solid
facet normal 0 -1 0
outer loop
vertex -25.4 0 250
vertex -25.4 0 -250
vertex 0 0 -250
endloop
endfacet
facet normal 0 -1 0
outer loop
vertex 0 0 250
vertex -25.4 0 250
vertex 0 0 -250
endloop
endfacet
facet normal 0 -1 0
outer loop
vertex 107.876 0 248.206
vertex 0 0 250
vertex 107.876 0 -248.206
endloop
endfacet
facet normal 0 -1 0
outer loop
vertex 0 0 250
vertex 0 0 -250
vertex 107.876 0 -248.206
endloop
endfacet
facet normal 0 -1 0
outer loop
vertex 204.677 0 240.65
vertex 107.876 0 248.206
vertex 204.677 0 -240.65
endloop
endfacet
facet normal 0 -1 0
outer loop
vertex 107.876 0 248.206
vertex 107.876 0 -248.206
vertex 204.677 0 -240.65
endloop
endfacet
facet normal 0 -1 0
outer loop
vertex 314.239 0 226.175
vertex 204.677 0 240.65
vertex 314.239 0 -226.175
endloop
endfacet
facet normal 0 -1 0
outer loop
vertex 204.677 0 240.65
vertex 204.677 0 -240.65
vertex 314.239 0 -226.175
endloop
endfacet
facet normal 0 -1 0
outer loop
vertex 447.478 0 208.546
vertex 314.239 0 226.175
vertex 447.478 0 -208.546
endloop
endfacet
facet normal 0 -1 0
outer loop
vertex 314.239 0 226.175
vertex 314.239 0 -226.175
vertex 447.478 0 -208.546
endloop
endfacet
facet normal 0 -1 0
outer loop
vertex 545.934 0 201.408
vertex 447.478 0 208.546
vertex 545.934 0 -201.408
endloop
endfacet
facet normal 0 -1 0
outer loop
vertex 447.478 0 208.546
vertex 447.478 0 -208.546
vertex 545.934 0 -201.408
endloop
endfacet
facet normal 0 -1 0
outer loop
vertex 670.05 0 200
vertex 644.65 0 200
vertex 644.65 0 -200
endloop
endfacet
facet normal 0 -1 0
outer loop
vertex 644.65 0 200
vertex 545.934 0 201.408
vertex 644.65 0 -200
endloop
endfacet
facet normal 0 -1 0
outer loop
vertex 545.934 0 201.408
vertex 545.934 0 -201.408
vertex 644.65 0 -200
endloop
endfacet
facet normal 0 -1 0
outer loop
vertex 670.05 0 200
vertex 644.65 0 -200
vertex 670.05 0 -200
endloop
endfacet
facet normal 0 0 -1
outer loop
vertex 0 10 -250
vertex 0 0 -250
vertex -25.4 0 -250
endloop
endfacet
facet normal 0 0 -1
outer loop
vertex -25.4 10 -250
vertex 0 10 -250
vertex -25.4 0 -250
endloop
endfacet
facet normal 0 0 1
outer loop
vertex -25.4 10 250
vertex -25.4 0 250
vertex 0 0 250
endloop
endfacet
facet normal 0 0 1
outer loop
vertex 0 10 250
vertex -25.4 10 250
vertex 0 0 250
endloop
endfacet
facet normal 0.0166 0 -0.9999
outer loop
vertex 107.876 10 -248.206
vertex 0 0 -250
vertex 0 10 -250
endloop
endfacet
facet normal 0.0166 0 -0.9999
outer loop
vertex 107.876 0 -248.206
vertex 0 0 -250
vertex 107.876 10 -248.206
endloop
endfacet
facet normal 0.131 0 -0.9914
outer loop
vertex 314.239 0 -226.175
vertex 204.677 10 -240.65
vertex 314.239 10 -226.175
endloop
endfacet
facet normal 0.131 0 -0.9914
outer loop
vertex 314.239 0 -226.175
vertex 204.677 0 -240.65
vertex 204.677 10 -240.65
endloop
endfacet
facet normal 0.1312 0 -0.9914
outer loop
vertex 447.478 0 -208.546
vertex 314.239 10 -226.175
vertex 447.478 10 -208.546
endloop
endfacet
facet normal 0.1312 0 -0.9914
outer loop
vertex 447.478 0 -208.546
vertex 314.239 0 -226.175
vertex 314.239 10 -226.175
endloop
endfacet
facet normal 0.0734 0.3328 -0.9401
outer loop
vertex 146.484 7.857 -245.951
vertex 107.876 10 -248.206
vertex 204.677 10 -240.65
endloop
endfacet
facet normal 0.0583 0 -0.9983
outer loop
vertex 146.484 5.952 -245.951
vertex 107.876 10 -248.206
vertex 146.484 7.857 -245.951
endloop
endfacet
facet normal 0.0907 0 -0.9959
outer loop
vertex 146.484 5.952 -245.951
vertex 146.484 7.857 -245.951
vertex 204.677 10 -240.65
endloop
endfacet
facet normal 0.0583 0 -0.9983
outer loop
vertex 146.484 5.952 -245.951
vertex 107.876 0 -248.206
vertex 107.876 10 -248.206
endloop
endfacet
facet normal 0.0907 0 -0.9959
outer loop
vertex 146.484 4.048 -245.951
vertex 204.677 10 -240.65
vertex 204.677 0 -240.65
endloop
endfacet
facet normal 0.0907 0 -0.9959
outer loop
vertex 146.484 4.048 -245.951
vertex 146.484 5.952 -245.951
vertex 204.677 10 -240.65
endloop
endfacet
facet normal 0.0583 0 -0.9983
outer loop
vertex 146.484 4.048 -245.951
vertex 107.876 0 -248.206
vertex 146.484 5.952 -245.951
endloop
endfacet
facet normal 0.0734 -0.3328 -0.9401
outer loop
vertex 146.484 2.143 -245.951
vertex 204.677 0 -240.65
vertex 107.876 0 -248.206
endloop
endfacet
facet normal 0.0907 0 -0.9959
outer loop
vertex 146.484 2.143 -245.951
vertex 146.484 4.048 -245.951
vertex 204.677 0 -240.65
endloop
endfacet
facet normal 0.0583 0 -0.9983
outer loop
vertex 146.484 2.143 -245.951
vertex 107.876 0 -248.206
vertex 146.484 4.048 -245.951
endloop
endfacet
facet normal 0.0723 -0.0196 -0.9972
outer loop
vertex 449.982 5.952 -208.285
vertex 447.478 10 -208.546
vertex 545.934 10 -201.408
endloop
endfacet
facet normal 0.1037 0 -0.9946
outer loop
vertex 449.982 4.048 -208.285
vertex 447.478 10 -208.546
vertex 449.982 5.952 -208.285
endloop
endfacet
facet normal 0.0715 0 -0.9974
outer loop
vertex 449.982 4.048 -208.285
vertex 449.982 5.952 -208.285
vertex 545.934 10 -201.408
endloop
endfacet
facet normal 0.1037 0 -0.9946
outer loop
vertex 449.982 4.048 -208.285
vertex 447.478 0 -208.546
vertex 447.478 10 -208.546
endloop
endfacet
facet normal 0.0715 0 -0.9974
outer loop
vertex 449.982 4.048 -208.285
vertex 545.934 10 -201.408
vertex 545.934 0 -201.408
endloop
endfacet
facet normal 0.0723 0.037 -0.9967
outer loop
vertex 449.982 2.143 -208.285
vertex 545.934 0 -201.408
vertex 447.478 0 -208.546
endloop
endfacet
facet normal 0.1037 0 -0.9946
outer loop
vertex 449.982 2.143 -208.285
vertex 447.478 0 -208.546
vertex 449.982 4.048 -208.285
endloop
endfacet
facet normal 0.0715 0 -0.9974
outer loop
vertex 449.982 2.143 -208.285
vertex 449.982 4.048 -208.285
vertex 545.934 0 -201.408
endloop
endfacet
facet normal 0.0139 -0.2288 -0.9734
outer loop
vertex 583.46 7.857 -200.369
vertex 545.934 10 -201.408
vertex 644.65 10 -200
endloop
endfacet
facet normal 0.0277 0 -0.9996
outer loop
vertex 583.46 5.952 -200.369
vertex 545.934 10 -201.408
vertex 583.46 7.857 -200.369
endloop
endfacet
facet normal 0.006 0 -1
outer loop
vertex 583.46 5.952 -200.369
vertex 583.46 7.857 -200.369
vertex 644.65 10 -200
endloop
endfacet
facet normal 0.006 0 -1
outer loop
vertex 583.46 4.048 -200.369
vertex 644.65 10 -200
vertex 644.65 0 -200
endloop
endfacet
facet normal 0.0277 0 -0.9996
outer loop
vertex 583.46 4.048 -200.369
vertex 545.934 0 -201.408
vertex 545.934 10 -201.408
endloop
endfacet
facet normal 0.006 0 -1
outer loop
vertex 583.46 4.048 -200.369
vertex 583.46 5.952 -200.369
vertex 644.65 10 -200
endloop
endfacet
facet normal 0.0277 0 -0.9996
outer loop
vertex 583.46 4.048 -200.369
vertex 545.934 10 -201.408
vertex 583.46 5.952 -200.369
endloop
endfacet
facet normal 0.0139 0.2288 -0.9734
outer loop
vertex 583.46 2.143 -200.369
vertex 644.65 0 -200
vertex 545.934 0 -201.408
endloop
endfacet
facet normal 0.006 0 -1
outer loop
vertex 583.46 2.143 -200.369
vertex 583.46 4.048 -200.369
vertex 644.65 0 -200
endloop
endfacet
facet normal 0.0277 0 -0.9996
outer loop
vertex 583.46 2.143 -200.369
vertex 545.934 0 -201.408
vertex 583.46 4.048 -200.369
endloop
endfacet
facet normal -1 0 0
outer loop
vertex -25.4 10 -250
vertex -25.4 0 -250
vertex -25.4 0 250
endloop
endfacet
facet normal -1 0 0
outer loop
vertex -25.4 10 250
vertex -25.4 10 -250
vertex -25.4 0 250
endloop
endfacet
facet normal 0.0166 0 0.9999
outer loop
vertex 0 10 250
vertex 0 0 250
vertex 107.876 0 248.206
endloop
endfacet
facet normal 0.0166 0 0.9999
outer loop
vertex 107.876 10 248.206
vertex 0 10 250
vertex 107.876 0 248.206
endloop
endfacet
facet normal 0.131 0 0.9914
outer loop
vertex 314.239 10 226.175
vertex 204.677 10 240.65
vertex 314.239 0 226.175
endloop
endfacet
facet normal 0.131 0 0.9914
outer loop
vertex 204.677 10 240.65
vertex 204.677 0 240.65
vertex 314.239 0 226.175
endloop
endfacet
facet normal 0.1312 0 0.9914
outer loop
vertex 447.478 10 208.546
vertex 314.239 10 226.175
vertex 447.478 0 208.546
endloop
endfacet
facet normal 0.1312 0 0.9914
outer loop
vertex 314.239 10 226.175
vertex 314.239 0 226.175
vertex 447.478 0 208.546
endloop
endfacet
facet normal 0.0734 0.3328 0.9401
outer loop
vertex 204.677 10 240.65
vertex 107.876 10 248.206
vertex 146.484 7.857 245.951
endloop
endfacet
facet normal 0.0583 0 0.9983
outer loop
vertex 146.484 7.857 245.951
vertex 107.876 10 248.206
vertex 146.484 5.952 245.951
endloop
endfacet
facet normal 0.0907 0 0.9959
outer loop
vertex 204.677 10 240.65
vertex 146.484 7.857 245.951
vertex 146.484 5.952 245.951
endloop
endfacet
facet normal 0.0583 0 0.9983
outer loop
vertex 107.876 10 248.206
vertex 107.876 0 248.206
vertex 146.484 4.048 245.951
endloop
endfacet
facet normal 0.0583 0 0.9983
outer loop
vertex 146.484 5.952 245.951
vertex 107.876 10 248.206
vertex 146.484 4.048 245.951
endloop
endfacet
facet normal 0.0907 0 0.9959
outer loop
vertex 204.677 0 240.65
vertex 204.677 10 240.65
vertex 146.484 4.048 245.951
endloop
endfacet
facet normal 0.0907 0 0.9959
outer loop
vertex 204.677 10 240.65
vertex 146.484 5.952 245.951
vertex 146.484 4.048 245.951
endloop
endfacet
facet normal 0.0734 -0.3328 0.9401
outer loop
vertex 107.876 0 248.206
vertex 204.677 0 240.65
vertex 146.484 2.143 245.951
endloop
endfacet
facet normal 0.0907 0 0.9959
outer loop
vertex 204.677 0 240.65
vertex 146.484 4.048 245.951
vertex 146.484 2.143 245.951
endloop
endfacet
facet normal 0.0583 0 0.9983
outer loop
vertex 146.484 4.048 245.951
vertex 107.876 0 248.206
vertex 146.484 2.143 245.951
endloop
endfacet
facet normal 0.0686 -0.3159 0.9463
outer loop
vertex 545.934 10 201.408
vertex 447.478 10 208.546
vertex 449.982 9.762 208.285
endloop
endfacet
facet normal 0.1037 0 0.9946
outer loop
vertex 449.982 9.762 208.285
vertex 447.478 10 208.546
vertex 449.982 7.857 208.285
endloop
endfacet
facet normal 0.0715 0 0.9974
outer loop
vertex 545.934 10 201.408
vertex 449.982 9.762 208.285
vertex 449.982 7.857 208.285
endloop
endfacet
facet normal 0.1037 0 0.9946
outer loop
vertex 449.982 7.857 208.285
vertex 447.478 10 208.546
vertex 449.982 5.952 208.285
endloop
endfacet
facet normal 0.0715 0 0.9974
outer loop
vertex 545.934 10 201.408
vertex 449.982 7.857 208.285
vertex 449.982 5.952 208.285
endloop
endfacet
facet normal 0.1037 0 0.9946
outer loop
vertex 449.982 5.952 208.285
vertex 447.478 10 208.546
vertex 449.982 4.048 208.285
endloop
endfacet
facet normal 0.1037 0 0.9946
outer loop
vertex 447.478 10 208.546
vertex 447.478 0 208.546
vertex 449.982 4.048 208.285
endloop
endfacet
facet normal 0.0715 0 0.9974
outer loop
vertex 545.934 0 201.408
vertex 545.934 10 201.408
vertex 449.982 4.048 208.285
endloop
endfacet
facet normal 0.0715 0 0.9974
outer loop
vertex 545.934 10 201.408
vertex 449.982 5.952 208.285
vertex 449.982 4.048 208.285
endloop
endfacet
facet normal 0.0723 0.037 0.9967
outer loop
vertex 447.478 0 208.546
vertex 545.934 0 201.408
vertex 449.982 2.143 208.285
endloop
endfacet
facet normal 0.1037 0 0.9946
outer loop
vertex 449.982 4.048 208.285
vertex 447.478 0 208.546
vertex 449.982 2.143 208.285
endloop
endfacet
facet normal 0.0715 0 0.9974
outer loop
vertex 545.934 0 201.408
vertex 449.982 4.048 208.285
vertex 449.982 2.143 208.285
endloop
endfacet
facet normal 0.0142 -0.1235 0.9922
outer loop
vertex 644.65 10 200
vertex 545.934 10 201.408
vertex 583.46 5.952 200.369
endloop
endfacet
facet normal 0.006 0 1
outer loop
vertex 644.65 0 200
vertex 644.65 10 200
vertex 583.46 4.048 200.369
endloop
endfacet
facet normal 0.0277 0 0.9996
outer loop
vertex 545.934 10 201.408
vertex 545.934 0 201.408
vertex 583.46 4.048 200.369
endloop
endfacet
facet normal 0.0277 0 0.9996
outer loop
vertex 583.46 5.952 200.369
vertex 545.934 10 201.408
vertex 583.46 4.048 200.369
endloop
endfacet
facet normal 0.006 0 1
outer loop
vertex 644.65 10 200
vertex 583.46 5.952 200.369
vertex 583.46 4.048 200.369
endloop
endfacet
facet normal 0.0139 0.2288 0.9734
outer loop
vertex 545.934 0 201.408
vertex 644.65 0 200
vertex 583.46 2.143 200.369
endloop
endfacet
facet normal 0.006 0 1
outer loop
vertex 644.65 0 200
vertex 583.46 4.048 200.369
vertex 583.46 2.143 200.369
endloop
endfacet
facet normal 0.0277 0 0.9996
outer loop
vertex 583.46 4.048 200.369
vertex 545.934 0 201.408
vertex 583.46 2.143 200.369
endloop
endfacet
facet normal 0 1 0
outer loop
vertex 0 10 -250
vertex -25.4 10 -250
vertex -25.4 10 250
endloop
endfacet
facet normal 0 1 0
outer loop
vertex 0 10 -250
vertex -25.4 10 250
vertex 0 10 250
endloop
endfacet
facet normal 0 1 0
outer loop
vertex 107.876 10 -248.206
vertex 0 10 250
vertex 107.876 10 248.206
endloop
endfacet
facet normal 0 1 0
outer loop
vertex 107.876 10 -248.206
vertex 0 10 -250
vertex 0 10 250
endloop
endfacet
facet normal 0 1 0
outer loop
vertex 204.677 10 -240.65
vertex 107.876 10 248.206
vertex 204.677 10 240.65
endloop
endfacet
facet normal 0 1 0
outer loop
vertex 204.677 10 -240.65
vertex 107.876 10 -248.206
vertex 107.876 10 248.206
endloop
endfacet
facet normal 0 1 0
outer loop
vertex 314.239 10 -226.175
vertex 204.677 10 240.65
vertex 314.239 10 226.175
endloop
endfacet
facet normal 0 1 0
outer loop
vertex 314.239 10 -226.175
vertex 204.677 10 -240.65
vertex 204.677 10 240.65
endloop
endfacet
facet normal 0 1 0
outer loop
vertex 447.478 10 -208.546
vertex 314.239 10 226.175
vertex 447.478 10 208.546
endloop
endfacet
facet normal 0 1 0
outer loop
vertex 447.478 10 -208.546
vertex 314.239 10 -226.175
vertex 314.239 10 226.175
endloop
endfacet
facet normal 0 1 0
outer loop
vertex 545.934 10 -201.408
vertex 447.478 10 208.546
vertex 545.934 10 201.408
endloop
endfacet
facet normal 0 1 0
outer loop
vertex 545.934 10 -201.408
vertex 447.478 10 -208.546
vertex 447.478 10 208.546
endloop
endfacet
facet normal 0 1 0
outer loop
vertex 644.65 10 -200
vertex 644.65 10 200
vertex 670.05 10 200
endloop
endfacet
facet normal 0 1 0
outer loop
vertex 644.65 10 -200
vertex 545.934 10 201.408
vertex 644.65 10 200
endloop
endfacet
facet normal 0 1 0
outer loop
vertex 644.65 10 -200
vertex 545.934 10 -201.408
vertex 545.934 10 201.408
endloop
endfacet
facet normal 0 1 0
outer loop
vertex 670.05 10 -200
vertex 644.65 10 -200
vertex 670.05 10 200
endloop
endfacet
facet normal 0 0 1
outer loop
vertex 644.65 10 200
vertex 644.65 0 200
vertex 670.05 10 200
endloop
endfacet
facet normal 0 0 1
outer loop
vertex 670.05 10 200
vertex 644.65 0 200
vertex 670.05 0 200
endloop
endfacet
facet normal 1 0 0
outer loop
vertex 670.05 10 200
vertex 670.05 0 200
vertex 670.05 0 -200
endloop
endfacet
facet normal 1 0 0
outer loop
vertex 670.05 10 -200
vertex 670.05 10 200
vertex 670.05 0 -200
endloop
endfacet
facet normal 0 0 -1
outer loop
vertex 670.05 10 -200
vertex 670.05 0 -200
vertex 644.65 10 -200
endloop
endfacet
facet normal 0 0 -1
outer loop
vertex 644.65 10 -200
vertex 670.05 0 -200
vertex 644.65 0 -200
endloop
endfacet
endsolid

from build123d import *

# Parameters (mm, degrees)
BOSS_EXTRUDE1_DEPTH = 10


with BuildPart() as part:
    # Sketch2 → Boss-Extrude1 (new body)
    with BuildSketch(Plane(origin=(0, 0, 0), x_dir=(1, 0, 0), z_dir=(0, 1, 0))):
        with BuildLine():
            Line((644.65, -200), (670.05, -200))
            Line((670.05, -200), (670.05, 200))
            Line((670.05, 200), (644.65, 200))
            add(Edge.make_bspline(
                [(0, 250), (2.521112677, 250), (6.209600906, 250.000000013), (15.016507291, 249.997525286), (20.396277848, 249.984804824), (27.70356243, 249.966782803), (32.958409359, 249.938976051), (39.469019484, 249.899575195), (45.353978298, 249.846095557), (51.697739738, 249.776222765), (59.577798777, 249.665078925), (72.055387865, 249.438693031), (88.938380089, 249.000224322), (110.277077943, 248.177942168), (134.422777808, 246.851031881), (158.55027755, 245.118473578), (182.641737439, 242.990791615), (208.646910269, 240.294638586), (234.607319329, 237.210998029), (260.529589307, 233.816247037), (286.421101664, 230.202184451), (310.358989888, 226.746607494), (334.291027152, 223.253392129), (358.228844737, 219.797816743), (384.120515654, 216.183750571), (410.042516088, 212.789005998), (433.001107322, 210.061958697), (452.986247288, 207.944588912), (471.042219017, 206.211322516), (489.117075126, 204.66496144), (510.224122789, 203.148964488), (531.359153773, 201.987923337), (549.478620255, 201.239741285), (564.778145102, 200.764489073), (575.615150606, 200.506371685), (585.077126141, 200.334920277), (592.950274347, 200.223777792), (599.293422889, 200.153904026), (605.18988803, 200.10042507), (611.673694072, 200.061023789), (616.977186653, 200.033217286), (624.206757774, 200.015195133), (629.71276906, 200.002474739), (638.382457019, 199.999999985), (642.128887323, 200), (644.65, 200)],
                knots=[0.083042309, 0.083042309, 0.083042309, 0.083042309, 0.083042309, 0.098618931, 0.106407242, 0.114195554, 0.121983865, 0.129772176, 0.137560487, 0.145348798, 0.153607863, 0.161866929, 0.17838506, 0.209538303, 0.240691546, 0.271844787, 0.302998032, 0.334151279, 0.365304526, 0.406540267, 0.437693511, 0.468846755, 0.5, 0.531153245, 0.562306489, 0.593459733, 0.634695474, 0.665848721, 0.681425345, 0.697001968, 0.728155213, 0.759308454, 0.790461697, 0.806038319, 0.82161494, 0.838133071, 0.846392137, 0.854651202, 0.862439513, 0.870227824, 0.878016135, 0.885804446, 0.893592758, 0.901381069, 0.916957691, 0.916957691, 0.916957691, 0.916957691, 0.916957691], degree=4))
            Line((0, 250), (-25.4, 250))
            Line((-25.4, 250), (-25.4, -250))
            Line((-25.4, -250), (0, -250))
            add(Edge.make_bspline(
                [(0, -250), (2.521112677, -250), (6.209600906, -250.000000013), (15.016507291, -249.997525286), (20.396277848, -249.984804824), (27.70356243, -249.966782803), (32.958409359, -249.938976051), (39.469019484, -249.899575195), (45.353978298, -249.846095557), (51.697739738, -249.776222765), (59.577798777, -249.665078925), (72.055387865, -249.438693031), (88.938380089, -249.000224322), (110.277077943, -248.177942168), (134.422777808, -246.851031881), (158.550277549, -245.118473579), (182.641737439, -242.990791616), (208.646910269, -240.294638586), (234.607319329, -237.210998029), (260.529589307, -233.816247037), (286.421101664, -230.202184451), (310.358989888, -226.746607494), (334.291027152, -223.253392129), (358.228844737, -219.797816743), (384.120515654, -216.183750571), (410.042516088, -212.789005998), (433.001107322, -210.061958698), (452.986247288, -207.944588912), (471.042219017, -206.211322517), (489.117075126, -204.66496144), (510.224122789, -203.148964488), (531.359153773, -201.987923337), (549.478620255, -201.239741285), (564.778145102, -200.764489073), (575.615150606, -200.506371685), (585.077126141, -200.334920277), (592.950274347, -200.223777792), (599.293422889, -200.153904027), (605.18988803, -200.10042507), (611.673694072, -200.061023789), (616.977186653, -200.033217286), (624.206757774, -200.015195133), (629.71276906, -200.002474739), (638.382457019, -199.999999985), (642.128887323, -200), (644.65, -200)],
                knots=[0.083042309, 0.083042309, 0.083042309, 0.083042309, 0.083042309, 0.098618931, 0.106407242, 0.114195554, 0.121983865, 0.129772176, 0.137560487, 0.145348798, 0.153607863, 0.161866929, 0.17838506, 0.209538303, 0.240691546, 0.271844787, 0.302998032, 0.334151279, 0.365304526, 0.406540267, 0.437693511, 0.468846755, 0.5, 0.531153245, 0.562306489, 0.593459733, 0.634695474, 0.665848721, 0.681425345, 0.697001968, 0.728155213, 0.759308454, 0.790461697, 0.806038319, 0.82161494, 0.838133071, 0.846392137, 0.854651202, 0.862439513, 0.870227824, 0.878016135, 0.885804446, 0.893592758, 0.901381069, 0.916957691, 0.916957691, 0.916957691, 0.916957691, 0.916957691], degree=4))
        make_face()
    extrude(amount=BOSS_EXTRUDE1_DEPTH)


solid = part.part
